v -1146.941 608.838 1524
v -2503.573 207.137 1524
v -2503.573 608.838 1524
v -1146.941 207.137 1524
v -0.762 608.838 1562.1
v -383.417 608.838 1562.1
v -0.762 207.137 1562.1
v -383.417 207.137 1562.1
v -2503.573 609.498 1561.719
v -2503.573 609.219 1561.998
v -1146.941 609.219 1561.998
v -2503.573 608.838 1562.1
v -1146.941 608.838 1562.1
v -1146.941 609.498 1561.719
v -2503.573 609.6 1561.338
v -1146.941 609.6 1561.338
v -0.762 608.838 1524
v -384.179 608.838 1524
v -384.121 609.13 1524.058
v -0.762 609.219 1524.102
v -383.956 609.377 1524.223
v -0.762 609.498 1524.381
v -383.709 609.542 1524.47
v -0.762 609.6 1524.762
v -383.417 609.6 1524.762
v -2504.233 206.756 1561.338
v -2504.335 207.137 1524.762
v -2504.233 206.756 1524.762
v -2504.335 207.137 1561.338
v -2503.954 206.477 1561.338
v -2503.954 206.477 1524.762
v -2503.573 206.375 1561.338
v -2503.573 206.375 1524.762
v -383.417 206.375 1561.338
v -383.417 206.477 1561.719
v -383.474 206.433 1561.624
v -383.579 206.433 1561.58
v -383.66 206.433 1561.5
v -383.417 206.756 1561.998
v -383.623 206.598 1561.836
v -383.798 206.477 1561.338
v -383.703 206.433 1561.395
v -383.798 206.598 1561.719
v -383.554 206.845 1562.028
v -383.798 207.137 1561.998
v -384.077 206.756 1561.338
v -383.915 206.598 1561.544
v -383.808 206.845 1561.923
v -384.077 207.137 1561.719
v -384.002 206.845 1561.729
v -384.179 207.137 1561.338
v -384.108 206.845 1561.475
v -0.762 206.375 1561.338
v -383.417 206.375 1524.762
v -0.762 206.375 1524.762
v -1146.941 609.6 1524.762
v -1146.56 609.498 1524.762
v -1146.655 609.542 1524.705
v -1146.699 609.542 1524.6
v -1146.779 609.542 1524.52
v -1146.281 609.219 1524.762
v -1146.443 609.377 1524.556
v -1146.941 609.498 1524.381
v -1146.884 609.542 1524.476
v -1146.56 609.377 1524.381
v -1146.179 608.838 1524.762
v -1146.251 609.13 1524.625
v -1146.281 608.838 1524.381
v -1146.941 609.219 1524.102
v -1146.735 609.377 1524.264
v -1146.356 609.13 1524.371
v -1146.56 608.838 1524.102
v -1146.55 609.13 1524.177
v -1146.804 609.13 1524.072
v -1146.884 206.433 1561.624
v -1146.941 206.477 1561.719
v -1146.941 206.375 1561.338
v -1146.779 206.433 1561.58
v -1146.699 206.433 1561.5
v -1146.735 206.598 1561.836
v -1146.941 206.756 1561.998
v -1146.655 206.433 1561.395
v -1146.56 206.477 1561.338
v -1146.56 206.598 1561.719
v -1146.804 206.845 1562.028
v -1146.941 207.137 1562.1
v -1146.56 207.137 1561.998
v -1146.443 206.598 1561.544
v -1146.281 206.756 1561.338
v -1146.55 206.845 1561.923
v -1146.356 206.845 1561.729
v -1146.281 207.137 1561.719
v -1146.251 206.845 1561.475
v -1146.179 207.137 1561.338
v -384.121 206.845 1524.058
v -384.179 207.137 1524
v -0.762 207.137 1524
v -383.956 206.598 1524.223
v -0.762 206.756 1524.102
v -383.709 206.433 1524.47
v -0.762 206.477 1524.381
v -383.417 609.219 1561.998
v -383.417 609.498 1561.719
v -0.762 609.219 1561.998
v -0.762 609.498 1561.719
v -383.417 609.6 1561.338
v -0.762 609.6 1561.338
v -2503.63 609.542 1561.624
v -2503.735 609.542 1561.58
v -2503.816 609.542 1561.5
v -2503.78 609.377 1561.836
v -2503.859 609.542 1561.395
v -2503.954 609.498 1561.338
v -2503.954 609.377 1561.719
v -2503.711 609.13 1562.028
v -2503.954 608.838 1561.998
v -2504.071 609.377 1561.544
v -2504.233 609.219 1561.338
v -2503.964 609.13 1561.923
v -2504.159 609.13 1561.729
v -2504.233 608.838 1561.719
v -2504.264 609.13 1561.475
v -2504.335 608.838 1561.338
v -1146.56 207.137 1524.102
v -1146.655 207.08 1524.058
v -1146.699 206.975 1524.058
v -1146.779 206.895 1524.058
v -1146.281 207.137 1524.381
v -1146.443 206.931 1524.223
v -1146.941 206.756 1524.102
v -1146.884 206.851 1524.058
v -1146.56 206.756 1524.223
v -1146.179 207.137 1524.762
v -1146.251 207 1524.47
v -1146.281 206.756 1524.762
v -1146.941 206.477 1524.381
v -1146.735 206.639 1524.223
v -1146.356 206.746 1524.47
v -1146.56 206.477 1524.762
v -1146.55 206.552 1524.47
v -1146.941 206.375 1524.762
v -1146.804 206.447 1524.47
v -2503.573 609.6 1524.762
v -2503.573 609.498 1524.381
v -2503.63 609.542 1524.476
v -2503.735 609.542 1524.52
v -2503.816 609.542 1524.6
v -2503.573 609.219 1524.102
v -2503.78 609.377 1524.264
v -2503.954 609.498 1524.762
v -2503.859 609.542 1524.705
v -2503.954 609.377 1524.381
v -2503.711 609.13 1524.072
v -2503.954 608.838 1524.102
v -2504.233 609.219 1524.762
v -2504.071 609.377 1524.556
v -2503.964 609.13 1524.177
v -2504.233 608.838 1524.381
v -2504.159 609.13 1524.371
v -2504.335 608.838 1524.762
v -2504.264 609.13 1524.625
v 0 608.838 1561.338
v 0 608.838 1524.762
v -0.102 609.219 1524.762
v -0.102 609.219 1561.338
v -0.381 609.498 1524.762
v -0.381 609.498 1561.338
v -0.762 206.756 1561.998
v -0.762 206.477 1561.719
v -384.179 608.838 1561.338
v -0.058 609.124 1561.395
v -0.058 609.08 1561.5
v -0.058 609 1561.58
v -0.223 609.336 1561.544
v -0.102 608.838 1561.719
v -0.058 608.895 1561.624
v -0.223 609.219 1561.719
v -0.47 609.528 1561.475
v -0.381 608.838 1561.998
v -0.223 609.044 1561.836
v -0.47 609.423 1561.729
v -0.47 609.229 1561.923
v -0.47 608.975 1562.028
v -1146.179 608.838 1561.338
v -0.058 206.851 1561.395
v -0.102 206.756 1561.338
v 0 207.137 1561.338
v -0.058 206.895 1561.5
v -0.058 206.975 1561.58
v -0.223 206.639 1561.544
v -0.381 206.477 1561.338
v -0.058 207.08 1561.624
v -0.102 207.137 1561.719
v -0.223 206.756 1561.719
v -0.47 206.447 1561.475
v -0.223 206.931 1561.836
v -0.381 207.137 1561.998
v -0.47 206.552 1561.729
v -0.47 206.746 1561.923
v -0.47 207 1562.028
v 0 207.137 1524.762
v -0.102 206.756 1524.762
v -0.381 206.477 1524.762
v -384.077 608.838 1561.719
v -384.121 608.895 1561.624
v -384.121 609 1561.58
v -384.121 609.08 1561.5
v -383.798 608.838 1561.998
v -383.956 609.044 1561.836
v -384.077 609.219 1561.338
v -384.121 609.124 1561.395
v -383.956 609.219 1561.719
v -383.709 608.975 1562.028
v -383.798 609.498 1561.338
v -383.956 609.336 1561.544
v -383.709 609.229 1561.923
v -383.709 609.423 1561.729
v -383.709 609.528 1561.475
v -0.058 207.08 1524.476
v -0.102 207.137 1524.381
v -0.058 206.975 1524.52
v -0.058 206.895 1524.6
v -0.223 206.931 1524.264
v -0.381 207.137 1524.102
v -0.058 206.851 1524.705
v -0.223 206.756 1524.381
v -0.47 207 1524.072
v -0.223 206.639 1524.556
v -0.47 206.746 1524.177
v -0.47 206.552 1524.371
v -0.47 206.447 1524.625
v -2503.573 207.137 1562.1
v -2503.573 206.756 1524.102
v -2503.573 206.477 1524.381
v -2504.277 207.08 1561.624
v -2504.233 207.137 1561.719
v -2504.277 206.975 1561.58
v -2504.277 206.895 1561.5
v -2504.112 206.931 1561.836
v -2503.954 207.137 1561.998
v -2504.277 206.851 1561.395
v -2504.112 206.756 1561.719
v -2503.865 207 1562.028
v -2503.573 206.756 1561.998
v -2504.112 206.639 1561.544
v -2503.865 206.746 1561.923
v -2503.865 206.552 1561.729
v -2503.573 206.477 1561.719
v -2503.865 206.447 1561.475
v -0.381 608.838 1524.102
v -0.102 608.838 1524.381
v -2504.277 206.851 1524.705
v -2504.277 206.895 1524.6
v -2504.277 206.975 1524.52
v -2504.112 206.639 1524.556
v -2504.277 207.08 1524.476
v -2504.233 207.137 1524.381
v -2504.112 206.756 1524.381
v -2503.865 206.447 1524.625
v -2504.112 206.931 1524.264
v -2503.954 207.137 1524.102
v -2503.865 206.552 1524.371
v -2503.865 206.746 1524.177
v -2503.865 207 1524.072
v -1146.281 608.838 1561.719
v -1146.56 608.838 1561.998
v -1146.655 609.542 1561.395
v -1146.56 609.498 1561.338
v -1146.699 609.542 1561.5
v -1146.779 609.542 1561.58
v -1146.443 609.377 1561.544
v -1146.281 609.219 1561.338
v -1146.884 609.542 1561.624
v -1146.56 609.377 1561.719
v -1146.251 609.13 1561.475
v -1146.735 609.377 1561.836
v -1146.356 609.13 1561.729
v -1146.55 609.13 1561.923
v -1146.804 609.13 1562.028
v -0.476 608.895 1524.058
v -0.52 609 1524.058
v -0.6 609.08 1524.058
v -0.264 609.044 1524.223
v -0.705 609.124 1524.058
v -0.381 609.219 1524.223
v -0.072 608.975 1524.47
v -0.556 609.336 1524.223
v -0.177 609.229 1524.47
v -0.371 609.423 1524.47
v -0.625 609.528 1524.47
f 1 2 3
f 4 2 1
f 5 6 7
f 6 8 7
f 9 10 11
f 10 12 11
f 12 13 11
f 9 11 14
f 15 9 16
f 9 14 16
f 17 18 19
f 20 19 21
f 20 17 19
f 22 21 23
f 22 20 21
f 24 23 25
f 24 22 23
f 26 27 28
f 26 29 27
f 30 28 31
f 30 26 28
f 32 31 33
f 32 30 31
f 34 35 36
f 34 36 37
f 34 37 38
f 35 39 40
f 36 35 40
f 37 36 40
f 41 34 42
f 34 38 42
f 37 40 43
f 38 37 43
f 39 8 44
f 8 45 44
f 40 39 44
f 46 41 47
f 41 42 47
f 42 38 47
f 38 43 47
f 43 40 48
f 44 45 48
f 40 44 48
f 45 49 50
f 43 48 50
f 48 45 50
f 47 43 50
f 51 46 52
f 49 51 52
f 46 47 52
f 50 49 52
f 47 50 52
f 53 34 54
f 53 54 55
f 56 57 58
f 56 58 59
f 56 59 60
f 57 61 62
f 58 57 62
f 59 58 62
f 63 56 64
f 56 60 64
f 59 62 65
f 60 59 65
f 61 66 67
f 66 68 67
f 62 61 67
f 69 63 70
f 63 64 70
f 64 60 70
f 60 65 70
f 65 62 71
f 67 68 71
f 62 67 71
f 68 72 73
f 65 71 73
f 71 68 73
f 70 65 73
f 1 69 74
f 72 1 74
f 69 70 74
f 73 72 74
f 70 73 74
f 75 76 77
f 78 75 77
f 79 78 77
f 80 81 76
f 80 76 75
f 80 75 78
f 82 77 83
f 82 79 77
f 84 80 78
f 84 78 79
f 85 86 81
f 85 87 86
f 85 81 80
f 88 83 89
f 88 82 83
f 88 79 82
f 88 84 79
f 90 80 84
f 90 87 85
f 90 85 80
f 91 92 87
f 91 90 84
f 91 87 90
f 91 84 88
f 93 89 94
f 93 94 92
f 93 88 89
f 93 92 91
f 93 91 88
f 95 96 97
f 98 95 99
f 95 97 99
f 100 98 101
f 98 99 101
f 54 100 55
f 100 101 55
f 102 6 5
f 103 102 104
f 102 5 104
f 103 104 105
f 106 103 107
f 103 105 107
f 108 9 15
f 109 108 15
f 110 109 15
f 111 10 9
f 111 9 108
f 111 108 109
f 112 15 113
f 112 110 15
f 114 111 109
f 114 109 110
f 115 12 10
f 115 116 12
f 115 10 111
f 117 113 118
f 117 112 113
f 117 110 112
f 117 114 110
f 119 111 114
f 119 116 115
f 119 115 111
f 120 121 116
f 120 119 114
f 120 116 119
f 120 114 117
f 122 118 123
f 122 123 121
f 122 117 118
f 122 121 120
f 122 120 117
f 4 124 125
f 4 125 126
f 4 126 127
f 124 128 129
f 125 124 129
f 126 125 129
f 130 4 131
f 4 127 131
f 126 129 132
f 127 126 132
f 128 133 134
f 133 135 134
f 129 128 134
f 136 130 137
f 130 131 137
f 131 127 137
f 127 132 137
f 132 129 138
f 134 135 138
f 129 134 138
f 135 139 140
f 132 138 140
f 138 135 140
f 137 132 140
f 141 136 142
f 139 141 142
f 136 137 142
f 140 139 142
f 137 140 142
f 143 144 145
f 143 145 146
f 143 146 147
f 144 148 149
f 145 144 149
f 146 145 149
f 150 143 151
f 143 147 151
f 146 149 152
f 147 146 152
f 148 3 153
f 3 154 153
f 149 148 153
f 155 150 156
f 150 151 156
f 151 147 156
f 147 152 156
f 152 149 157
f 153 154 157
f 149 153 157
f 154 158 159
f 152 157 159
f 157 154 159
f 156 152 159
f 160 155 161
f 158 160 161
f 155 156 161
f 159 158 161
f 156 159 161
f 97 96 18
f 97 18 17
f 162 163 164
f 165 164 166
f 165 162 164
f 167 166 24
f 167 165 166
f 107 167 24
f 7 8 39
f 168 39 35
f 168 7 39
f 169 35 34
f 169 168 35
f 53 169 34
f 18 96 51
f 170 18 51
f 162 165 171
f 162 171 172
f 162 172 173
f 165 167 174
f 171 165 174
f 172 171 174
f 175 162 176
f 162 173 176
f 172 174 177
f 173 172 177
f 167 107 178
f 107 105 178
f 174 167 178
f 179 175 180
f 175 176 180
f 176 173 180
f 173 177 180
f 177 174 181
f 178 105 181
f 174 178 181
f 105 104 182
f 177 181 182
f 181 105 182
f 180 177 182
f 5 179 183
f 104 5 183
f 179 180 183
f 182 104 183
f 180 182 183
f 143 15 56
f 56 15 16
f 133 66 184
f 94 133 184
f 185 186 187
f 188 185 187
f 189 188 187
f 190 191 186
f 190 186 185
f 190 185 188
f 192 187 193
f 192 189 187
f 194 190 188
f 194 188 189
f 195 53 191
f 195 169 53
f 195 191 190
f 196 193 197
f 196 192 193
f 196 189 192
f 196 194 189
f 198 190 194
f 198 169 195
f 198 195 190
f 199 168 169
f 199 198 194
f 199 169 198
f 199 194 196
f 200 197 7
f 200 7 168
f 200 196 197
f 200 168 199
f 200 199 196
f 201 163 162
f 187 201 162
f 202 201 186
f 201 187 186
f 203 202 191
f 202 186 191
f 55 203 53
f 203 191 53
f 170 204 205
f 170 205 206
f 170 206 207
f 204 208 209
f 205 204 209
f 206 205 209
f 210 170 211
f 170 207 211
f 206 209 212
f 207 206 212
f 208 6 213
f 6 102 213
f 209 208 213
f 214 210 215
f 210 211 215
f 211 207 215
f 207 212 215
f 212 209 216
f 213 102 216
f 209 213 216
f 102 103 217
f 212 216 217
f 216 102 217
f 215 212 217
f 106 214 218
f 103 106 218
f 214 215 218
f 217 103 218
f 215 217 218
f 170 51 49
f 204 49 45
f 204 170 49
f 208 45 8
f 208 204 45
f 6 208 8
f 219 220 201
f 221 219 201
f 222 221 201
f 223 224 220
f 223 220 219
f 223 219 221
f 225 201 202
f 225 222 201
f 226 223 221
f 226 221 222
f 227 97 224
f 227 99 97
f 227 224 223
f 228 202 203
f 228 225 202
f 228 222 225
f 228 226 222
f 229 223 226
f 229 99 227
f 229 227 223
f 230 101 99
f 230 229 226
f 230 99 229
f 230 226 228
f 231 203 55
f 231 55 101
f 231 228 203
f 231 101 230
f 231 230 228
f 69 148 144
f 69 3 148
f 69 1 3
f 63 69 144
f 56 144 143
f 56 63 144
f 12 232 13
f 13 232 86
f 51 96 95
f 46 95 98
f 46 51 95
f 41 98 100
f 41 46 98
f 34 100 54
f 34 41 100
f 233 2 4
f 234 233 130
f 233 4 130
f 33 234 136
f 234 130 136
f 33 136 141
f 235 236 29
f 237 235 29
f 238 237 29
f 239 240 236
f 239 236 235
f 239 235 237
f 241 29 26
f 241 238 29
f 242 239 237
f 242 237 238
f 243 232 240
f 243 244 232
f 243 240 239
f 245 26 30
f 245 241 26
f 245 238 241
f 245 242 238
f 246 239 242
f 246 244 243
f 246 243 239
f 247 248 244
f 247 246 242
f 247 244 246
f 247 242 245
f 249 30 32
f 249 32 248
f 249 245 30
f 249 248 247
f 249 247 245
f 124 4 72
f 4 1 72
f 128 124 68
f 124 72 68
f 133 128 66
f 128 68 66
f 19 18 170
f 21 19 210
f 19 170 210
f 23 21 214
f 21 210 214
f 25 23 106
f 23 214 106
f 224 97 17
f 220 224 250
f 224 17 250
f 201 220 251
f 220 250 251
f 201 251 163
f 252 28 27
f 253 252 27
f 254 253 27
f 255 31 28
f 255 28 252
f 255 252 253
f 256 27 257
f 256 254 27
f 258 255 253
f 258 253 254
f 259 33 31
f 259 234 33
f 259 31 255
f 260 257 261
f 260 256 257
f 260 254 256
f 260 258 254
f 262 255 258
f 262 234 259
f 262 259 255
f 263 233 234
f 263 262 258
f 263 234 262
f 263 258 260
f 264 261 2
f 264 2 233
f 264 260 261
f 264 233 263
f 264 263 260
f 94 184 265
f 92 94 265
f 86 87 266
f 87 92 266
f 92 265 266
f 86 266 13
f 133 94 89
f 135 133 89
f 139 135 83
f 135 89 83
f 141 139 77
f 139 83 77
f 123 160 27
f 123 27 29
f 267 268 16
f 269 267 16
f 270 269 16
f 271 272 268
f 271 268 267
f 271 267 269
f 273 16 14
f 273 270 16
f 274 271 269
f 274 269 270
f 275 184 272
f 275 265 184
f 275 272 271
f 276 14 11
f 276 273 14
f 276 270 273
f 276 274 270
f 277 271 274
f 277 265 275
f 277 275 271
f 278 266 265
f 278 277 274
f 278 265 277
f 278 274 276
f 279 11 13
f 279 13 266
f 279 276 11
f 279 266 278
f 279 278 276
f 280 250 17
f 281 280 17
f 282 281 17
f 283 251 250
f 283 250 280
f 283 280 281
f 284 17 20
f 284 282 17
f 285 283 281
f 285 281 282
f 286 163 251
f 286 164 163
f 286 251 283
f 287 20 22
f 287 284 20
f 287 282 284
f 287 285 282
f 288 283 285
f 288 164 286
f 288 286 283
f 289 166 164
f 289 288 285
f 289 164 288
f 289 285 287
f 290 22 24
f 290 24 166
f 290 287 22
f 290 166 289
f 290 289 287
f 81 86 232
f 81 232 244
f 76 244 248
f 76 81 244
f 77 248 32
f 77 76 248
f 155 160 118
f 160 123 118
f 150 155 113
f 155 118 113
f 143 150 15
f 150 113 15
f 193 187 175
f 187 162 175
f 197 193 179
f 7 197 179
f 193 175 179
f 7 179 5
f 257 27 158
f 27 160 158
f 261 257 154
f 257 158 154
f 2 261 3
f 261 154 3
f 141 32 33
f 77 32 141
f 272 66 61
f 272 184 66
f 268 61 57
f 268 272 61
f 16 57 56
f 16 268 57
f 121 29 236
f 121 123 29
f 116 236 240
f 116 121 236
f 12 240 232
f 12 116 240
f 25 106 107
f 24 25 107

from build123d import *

# Parameters (mm, degrees)
F1_START = -206.375
F0_W     = 1358.1562537551
F0_H     = 38.1
F1_DEPTH = 403.225
F0_W_2   = 384.1790530003
F2_R     = 0.762
F2_2_R   = 0.762


with BuildPart() as f1:
    # F0 (on Front) → F1 (new body)
    with BuildSketch(Plane.XZ.offset(F1_START)):
        with Locations((-1825.2571798778, 1543.05)):
            Rectangle(F0_W, F0_H)
    extrude(amount=-F1_DEPTH)

    # F2
    f2_edges = [f1.edges().sort_by_distance(p)[0] for p in [
        (-1146.179053, 407.9875, 1562.1),
        (-1825.25718, 206.375, 1562.1),
        (-1146.179053, 206.375, 1543.05),
        (-1146.179053, 407.9875, 1524),
        (-1825.25718, 206.375, 1524),
        (-1146.179053, 609.6, 1543.05),
        (-2504.335307, 407.9875, 1562.1),
        (-2504.335307, 206.375, 1543.05),
        (-1825.25718, 609.6, 1562.1),
        (-2504.335307, 407.9875, 1524),
        (-1825.25718, 609.6, 1524),
        (-2504.335307, 609.6, 1543.05),
    ]]
    fillet(f2_edges, radius=F2_R)


with BuildPart() as f1b:
    # F0 (on Front) → F1, piece 2 (new body)
    with BuildSketch(Plane.XZ.offset(F1_START)):
        with Locations((-192.0895265001, 1543.05)):
            Rectangle(F0_W_2, F0_H)
    extrude(amount=-F1_DEPTH)

    # F2#2
    f2_2_edges = [f1b.edges().sort_by_distance(p)[0] for p in [
        (-192.089527, 609.6, 1562.1),
        (-384.179053, 407.9875, 1562.1),
        (-192.089527, 206.375, 1562.1),
        (-384.179053, 206.375, 1543.05),
        (-192.089527, 206.375, 1524),
        (0, 609.6, 1543.05),
        (0, 407.9875, 1524),
        (0, 206.375, 1543.05),
        (0, 407.9875, 1562.1),
        (-384.179053, 609.6, 1543.05),
        (-192.089527, 609.6, 1524),
    ]]
    fillet(f2_2_edges, radius=F2_2_R)


solid = Compound([f1.part, f1b.part])
